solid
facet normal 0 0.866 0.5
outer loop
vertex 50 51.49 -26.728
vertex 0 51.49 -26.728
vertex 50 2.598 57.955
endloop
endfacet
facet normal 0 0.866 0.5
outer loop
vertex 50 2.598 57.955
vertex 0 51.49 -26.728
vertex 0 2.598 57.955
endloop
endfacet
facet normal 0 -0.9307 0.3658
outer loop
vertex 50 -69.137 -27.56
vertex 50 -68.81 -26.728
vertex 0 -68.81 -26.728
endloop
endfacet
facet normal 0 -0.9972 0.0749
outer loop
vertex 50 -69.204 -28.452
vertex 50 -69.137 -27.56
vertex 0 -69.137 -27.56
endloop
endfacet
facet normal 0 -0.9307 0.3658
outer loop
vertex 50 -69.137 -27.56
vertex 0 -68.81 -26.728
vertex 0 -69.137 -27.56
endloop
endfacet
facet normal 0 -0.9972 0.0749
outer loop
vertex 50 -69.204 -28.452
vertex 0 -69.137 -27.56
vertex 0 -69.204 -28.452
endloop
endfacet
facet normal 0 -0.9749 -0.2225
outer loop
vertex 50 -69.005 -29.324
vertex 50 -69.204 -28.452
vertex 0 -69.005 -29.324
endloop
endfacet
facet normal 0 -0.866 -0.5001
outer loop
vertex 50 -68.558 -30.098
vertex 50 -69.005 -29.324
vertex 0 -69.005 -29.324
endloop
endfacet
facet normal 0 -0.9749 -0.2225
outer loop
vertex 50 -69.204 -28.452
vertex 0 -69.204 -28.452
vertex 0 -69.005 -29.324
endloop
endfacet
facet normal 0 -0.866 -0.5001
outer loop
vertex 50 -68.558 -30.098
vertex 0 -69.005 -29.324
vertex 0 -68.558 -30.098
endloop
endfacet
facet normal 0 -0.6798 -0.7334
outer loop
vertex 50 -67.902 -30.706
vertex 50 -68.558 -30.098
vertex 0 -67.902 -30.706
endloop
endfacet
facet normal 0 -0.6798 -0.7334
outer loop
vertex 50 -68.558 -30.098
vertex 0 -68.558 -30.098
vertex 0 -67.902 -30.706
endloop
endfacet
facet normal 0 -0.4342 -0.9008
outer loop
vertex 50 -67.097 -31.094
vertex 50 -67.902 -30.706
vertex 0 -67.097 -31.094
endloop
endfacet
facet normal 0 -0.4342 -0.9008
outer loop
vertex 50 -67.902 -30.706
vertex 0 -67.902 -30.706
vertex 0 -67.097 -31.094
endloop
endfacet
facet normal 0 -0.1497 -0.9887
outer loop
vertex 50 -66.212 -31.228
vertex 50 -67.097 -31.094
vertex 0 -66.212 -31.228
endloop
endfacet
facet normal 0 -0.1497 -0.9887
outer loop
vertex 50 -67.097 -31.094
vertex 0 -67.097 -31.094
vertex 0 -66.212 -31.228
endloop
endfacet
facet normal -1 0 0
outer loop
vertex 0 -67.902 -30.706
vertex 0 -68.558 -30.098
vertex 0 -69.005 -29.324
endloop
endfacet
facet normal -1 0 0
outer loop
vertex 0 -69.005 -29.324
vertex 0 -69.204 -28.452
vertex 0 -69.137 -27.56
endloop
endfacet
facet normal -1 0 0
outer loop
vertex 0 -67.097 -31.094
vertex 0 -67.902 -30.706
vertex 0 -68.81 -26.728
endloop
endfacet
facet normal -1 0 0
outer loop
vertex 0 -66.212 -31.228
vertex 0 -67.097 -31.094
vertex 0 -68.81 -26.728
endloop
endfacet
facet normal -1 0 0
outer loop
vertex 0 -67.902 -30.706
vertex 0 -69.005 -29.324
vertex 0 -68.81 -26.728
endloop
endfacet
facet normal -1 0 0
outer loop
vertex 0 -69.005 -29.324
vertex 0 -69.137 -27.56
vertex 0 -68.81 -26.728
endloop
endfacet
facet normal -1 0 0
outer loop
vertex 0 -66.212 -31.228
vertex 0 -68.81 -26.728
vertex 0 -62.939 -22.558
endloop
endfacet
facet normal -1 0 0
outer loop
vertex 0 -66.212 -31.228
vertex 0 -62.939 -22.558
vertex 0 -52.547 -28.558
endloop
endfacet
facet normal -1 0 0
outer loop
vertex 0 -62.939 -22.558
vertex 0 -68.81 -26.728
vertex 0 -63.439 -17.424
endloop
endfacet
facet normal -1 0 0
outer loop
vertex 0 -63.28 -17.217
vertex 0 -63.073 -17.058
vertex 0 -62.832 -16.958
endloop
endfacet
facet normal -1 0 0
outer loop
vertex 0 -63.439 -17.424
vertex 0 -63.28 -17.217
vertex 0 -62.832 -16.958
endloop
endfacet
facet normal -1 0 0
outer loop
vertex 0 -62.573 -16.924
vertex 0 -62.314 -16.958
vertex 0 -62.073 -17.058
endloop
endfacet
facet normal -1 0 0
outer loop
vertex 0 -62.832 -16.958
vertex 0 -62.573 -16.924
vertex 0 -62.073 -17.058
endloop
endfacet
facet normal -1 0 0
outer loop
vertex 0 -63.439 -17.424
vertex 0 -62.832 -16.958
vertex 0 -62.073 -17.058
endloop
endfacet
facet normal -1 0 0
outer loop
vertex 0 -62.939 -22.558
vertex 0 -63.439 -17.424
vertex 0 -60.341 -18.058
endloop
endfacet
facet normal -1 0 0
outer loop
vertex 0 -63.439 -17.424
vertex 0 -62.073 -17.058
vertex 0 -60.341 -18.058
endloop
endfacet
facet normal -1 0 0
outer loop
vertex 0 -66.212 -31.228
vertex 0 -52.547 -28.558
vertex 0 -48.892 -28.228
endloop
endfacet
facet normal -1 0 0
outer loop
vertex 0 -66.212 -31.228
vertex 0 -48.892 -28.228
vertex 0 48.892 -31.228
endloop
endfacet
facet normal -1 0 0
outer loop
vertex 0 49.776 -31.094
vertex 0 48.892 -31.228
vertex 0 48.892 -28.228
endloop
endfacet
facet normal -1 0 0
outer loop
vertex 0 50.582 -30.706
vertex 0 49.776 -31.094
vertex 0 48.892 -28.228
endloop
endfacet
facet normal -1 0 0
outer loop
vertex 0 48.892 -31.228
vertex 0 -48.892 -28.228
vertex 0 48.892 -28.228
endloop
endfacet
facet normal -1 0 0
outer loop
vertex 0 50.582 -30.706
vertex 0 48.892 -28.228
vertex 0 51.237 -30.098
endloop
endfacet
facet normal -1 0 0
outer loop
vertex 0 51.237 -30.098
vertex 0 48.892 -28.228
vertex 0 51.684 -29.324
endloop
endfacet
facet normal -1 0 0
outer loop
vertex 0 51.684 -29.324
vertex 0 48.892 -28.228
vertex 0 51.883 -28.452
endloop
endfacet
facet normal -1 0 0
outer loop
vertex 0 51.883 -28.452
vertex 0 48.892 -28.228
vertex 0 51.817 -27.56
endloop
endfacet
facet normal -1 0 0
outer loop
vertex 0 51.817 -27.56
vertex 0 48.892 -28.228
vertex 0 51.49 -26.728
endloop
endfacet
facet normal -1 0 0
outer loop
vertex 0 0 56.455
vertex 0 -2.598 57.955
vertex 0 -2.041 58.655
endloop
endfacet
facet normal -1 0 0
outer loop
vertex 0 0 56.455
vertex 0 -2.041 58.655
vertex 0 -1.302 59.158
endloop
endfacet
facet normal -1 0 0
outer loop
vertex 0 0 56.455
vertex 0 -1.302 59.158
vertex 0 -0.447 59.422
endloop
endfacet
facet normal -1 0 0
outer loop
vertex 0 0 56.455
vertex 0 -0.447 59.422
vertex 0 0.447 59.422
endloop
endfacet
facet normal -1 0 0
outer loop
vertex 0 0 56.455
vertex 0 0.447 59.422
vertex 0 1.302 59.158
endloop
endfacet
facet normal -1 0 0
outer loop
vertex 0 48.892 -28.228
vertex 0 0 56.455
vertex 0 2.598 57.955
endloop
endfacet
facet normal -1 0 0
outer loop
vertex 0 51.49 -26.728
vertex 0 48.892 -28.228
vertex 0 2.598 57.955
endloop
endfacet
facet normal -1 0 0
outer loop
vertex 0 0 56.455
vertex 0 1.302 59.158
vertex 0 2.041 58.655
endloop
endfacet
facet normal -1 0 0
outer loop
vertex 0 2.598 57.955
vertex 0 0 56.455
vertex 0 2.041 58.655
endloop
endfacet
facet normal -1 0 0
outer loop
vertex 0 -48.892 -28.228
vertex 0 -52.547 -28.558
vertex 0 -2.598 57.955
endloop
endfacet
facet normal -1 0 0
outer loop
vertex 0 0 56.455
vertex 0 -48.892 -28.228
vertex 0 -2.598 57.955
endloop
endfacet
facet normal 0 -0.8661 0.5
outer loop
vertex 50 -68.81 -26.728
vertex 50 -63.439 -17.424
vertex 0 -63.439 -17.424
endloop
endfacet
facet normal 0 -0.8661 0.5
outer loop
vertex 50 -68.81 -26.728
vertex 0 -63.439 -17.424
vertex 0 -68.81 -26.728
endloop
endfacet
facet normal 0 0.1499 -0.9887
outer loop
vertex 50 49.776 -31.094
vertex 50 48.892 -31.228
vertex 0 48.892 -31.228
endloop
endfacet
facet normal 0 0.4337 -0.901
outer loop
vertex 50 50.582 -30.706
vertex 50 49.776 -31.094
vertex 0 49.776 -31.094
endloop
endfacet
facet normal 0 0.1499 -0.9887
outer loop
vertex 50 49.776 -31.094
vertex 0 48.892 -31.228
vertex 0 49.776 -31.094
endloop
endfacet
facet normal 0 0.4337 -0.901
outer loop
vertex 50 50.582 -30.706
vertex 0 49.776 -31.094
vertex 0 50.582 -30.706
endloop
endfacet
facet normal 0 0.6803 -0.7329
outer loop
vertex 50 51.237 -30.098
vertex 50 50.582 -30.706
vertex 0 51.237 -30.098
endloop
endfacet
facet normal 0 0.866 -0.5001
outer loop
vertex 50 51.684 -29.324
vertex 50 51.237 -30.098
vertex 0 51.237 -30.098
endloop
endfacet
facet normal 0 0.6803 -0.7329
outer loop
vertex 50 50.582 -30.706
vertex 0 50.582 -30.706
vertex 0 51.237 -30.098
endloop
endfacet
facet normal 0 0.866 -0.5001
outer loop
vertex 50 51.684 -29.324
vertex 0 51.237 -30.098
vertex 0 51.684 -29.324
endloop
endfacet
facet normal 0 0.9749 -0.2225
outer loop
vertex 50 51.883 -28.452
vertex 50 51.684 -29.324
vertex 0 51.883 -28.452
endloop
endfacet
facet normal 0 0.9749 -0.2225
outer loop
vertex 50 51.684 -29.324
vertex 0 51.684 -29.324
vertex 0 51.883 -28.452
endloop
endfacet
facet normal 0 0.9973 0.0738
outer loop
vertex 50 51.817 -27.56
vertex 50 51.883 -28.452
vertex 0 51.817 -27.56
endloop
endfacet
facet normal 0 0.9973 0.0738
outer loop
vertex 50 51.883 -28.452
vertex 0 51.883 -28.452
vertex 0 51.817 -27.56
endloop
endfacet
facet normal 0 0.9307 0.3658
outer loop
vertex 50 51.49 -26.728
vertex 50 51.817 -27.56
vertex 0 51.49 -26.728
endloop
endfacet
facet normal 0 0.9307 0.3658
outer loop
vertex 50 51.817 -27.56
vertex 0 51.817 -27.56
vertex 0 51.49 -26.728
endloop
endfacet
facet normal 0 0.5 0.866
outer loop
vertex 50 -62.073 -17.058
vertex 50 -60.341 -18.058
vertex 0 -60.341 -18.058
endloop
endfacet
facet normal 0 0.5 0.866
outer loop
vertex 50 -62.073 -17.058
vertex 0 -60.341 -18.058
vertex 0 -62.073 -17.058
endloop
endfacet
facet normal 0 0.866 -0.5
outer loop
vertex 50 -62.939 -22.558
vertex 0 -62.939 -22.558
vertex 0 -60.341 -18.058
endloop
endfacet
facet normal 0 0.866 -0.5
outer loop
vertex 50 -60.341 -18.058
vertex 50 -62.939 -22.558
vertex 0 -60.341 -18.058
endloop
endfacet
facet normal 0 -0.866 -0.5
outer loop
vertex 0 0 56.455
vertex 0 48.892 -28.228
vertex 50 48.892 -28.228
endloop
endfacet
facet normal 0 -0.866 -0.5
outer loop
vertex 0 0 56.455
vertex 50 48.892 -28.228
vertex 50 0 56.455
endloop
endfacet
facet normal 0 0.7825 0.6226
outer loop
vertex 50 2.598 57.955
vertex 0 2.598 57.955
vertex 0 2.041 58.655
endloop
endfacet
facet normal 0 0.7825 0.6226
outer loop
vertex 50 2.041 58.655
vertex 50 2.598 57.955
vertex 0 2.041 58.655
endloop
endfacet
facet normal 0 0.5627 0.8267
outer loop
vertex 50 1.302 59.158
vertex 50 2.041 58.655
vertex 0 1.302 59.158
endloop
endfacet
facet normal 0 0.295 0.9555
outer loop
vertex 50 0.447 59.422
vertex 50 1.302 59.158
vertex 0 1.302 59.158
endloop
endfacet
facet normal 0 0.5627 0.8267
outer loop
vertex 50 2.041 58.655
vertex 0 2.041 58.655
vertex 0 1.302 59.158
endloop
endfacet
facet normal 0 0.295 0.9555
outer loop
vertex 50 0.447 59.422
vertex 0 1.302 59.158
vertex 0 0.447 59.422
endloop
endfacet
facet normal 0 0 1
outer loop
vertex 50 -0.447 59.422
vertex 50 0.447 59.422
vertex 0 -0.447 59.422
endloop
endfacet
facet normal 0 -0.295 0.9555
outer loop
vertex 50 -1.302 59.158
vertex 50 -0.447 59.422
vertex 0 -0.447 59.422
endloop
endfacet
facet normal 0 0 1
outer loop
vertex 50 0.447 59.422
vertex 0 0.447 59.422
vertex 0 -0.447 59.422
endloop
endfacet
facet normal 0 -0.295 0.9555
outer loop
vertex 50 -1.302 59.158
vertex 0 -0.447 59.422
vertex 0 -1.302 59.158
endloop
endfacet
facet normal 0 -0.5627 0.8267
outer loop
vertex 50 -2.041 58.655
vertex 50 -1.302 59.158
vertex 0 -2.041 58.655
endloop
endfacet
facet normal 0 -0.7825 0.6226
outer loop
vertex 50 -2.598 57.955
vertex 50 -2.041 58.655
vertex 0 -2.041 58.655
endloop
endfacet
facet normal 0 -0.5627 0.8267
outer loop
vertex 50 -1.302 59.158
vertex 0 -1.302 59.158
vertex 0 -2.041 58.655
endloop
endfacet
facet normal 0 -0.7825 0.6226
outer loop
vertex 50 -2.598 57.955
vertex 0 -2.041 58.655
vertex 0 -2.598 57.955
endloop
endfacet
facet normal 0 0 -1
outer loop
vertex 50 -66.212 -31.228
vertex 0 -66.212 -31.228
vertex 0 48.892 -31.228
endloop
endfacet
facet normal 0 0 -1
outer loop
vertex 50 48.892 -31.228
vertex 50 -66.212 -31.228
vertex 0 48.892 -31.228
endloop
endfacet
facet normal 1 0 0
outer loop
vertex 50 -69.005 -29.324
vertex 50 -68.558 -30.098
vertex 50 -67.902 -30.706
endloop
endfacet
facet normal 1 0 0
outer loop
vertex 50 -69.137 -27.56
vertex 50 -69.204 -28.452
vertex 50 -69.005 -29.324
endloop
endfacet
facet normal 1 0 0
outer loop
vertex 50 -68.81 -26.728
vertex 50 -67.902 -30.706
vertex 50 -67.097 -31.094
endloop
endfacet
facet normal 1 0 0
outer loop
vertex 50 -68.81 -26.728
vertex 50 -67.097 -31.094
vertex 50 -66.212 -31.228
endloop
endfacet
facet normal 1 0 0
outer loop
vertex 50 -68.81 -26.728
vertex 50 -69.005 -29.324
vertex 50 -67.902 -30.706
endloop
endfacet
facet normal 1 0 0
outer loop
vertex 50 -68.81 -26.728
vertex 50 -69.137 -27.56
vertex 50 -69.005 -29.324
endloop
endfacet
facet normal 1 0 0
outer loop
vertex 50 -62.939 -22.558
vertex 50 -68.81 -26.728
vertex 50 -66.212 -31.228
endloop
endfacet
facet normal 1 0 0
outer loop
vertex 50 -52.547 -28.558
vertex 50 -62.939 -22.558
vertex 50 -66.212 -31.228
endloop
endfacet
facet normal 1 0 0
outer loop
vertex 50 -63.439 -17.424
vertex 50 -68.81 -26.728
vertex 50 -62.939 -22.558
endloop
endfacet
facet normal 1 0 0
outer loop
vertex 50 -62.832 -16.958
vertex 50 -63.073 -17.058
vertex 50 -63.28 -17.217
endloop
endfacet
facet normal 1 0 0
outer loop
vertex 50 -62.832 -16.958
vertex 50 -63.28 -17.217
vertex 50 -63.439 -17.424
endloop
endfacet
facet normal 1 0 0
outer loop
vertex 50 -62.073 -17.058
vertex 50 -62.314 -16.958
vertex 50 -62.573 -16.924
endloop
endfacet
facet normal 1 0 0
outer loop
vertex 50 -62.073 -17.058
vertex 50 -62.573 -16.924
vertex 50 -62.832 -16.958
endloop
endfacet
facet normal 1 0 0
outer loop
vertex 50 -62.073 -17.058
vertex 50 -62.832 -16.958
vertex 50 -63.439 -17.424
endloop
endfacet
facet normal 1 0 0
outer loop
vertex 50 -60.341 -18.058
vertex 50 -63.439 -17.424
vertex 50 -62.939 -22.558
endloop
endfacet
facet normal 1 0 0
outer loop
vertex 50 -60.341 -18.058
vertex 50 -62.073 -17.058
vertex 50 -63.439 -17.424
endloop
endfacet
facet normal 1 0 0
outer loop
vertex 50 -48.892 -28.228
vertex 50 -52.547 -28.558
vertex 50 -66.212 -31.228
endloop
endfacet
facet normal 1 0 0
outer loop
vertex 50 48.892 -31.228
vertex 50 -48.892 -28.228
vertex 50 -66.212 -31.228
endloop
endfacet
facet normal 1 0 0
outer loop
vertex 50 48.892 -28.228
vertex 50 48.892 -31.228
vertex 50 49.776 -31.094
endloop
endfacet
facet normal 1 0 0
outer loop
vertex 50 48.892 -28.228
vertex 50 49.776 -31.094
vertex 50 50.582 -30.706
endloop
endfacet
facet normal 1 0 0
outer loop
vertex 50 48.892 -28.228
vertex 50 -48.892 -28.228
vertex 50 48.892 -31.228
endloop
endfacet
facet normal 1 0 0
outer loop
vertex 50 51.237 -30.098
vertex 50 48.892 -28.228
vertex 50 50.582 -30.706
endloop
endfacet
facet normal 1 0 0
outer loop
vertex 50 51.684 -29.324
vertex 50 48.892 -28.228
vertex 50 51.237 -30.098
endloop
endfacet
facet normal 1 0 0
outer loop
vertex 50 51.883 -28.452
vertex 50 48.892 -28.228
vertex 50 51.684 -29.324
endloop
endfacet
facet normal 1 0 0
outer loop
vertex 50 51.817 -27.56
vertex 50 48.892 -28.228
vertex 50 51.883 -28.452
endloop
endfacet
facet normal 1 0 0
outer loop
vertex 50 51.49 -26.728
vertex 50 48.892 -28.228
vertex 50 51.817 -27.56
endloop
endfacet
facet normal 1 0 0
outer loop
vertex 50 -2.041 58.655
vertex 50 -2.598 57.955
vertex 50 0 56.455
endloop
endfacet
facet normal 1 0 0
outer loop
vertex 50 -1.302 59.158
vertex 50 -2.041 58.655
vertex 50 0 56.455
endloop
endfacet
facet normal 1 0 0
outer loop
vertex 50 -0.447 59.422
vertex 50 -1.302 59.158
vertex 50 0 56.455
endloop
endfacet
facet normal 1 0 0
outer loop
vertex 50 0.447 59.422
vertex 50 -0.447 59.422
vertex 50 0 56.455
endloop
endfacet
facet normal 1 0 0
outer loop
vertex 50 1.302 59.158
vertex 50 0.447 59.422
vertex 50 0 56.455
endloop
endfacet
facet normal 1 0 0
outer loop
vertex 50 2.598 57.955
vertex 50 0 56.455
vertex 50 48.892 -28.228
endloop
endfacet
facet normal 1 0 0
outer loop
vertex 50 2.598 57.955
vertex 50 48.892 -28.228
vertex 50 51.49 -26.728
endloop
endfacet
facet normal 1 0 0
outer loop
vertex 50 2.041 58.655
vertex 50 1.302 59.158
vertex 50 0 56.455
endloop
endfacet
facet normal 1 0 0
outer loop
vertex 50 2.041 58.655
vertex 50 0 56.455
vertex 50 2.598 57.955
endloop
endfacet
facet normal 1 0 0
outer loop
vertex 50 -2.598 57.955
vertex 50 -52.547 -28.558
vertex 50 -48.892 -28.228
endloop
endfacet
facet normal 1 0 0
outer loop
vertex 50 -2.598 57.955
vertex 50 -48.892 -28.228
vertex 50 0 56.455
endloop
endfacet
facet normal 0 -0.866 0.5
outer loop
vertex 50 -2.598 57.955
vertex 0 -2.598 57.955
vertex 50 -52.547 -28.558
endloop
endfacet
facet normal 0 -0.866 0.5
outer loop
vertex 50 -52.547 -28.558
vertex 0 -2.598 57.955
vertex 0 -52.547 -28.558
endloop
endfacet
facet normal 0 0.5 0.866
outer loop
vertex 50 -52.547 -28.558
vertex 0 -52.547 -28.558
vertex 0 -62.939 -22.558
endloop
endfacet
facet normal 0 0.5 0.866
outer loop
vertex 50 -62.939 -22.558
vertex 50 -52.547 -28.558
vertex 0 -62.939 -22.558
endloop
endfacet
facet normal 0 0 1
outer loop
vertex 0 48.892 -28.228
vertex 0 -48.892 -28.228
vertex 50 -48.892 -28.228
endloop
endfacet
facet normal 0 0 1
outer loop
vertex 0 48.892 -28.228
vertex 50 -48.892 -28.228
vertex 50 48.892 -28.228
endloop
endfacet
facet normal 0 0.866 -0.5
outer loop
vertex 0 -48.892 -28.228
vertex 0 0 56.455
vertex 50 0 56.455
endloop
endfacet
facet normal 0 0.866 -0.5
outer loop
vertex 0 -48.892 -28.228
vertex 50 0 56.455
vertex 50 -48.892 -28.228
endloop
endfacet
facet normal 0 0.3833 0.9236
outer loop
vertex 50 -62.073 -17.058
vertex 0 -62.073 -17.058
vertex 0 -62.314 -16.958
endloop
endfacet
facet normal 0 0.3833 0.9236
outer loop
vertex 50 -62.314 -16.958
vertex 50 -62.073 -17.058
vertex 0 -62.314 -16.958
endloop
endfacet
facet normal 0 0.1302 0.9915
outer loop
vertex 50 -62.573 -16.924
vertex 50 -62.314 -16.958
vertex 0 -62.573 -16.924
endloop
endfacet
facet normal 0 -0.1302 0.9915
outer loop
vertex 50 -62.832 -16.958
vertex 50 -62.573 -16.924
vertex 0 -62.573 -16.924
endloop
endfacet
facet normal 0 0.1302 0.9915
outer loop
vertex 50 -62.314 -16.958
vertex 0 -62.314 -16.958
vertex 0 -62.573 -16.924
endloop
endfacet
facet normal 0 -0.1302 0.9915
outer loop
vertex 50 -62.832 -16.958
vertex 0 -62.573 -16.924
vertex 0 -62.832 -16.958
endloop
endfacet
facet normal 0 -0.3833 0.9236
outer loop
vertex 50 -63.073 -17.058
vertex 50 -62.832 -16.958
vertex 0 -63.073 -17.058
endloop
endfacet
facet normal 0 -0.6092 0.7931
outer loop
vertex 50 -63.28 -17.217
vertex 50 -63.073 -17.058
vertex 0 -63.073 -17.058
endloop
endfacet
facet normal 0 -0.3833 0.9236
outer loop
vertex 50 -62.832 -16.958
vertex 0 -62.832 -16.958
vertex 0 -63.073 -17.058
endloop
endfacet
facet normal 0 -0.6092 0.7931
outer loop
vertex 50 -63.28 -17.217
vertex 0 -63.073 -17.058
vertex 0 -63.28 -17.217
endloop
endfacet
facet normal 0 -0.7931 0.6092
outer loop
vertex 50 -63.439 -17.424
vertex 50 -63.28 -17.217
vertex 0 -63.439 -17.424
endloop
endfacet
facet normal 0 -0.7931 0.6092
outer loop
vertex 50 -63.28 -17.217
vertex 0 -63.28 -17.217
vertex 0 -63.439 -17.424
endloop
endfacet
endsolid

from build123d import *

# Parameters (mm, degrees)
F1_DEPTH = 50
F2_T     = 3
F4_DEPTH = 50


# Not quite as in the source:
# - a shell that OpenCascade refuses in one call is made with other operations: the cavity is built on its own and cut out


with BuildPart() as f1:
    # F0 (on Right) → F1 (new body)
    with BuildSketch(Plane.YZ):
        with BuildLine():
            Line((-2.5980762114, 57.9554029985), (-54.0879656003, -31.2277014993))
            Line((-54.0879656003, -31.2277014993), (48.8918131776, -31.2277014993))
            ThreePointArc((48.8918131776, -31.2277014993), (51.4898893889, -29.7277014993), (51.4898893889, -26.7277014993))
            Line((51.4898893889, -26.7277014993), (2.5980762114, 57.9554029985))
            ThreePointArc((2.5980762114, 57.9554029985), (0, 59.4554029985), (-2.5980762114, 57.9554029985))
        make_face()
    extrude(amount=F1_DEPTH)

    # F2: shell of thickness 3, made by hand


with BuildPart() as f2_core1:
    # F2_t2: copy of F1
    add(f1.part)

    # the walls: a layer under each face that stays
    f2_faces = [f2_core1.faces().sort_by_distance(p)[0] for p in [
        (25, -28.3430209058, 13.3638507496),
        (25, -2.5980762114, -31.2277014993),
        (25, 27.0439828001, 15.6138507496),
    ]]
    thicken(f2_faces, amount=-F2_T, mode=Mode.SUBTRACT)


with BuildPart() as f1_1:
    add(f1.part)

    # what is left inside the walls is the cavity
    f2_cavity = [f2_core1.part.solids().sort_by_distance(p)[0] for p in [
        (33.333333, -24.419926, 14.098851),
    ]]
    add(f2_cavity, mode=Mode.SUBTRACT)

    # F3 (on Right) → F4 (join)
    with BuildSketch(Plane.YZ):
        with BuildLine():
            Line((-54.0879656003, -31.2277014993), (-52.5466056017, -28.5579876689))
            Line((-52.5466056017, -28.5579876689), (-62.9389104471, -22.5579876689))
            Line((-62.9389104471, -22.5579876689), (-60.3408342357, -18.0579876689))
            Line((-60.3408342357, -18.0579876689), (-62.0728850433, -17.0579876689))
            ThreePointArc((-62.0728850433, -17.0579876689), (-62.8317040884, -16.9580872464), (-63.4389104471, -17.4240130727))
            Line((-63.4389104471, -17.4240130727), (-68.8103974646, -26.7277014993))
            ThreePointArc((-68.8103974646, -26.7277014993), (-68.8103974646, -29.7277014993), (-66.2123212533, -31.2277014993))
            Line((-66.2123212533, -31.2277014993), (-54.0879656003, -31.2277014993))
        make_face()
    extrude(amount=F4_DEPTH)


solid = f1_1.part
